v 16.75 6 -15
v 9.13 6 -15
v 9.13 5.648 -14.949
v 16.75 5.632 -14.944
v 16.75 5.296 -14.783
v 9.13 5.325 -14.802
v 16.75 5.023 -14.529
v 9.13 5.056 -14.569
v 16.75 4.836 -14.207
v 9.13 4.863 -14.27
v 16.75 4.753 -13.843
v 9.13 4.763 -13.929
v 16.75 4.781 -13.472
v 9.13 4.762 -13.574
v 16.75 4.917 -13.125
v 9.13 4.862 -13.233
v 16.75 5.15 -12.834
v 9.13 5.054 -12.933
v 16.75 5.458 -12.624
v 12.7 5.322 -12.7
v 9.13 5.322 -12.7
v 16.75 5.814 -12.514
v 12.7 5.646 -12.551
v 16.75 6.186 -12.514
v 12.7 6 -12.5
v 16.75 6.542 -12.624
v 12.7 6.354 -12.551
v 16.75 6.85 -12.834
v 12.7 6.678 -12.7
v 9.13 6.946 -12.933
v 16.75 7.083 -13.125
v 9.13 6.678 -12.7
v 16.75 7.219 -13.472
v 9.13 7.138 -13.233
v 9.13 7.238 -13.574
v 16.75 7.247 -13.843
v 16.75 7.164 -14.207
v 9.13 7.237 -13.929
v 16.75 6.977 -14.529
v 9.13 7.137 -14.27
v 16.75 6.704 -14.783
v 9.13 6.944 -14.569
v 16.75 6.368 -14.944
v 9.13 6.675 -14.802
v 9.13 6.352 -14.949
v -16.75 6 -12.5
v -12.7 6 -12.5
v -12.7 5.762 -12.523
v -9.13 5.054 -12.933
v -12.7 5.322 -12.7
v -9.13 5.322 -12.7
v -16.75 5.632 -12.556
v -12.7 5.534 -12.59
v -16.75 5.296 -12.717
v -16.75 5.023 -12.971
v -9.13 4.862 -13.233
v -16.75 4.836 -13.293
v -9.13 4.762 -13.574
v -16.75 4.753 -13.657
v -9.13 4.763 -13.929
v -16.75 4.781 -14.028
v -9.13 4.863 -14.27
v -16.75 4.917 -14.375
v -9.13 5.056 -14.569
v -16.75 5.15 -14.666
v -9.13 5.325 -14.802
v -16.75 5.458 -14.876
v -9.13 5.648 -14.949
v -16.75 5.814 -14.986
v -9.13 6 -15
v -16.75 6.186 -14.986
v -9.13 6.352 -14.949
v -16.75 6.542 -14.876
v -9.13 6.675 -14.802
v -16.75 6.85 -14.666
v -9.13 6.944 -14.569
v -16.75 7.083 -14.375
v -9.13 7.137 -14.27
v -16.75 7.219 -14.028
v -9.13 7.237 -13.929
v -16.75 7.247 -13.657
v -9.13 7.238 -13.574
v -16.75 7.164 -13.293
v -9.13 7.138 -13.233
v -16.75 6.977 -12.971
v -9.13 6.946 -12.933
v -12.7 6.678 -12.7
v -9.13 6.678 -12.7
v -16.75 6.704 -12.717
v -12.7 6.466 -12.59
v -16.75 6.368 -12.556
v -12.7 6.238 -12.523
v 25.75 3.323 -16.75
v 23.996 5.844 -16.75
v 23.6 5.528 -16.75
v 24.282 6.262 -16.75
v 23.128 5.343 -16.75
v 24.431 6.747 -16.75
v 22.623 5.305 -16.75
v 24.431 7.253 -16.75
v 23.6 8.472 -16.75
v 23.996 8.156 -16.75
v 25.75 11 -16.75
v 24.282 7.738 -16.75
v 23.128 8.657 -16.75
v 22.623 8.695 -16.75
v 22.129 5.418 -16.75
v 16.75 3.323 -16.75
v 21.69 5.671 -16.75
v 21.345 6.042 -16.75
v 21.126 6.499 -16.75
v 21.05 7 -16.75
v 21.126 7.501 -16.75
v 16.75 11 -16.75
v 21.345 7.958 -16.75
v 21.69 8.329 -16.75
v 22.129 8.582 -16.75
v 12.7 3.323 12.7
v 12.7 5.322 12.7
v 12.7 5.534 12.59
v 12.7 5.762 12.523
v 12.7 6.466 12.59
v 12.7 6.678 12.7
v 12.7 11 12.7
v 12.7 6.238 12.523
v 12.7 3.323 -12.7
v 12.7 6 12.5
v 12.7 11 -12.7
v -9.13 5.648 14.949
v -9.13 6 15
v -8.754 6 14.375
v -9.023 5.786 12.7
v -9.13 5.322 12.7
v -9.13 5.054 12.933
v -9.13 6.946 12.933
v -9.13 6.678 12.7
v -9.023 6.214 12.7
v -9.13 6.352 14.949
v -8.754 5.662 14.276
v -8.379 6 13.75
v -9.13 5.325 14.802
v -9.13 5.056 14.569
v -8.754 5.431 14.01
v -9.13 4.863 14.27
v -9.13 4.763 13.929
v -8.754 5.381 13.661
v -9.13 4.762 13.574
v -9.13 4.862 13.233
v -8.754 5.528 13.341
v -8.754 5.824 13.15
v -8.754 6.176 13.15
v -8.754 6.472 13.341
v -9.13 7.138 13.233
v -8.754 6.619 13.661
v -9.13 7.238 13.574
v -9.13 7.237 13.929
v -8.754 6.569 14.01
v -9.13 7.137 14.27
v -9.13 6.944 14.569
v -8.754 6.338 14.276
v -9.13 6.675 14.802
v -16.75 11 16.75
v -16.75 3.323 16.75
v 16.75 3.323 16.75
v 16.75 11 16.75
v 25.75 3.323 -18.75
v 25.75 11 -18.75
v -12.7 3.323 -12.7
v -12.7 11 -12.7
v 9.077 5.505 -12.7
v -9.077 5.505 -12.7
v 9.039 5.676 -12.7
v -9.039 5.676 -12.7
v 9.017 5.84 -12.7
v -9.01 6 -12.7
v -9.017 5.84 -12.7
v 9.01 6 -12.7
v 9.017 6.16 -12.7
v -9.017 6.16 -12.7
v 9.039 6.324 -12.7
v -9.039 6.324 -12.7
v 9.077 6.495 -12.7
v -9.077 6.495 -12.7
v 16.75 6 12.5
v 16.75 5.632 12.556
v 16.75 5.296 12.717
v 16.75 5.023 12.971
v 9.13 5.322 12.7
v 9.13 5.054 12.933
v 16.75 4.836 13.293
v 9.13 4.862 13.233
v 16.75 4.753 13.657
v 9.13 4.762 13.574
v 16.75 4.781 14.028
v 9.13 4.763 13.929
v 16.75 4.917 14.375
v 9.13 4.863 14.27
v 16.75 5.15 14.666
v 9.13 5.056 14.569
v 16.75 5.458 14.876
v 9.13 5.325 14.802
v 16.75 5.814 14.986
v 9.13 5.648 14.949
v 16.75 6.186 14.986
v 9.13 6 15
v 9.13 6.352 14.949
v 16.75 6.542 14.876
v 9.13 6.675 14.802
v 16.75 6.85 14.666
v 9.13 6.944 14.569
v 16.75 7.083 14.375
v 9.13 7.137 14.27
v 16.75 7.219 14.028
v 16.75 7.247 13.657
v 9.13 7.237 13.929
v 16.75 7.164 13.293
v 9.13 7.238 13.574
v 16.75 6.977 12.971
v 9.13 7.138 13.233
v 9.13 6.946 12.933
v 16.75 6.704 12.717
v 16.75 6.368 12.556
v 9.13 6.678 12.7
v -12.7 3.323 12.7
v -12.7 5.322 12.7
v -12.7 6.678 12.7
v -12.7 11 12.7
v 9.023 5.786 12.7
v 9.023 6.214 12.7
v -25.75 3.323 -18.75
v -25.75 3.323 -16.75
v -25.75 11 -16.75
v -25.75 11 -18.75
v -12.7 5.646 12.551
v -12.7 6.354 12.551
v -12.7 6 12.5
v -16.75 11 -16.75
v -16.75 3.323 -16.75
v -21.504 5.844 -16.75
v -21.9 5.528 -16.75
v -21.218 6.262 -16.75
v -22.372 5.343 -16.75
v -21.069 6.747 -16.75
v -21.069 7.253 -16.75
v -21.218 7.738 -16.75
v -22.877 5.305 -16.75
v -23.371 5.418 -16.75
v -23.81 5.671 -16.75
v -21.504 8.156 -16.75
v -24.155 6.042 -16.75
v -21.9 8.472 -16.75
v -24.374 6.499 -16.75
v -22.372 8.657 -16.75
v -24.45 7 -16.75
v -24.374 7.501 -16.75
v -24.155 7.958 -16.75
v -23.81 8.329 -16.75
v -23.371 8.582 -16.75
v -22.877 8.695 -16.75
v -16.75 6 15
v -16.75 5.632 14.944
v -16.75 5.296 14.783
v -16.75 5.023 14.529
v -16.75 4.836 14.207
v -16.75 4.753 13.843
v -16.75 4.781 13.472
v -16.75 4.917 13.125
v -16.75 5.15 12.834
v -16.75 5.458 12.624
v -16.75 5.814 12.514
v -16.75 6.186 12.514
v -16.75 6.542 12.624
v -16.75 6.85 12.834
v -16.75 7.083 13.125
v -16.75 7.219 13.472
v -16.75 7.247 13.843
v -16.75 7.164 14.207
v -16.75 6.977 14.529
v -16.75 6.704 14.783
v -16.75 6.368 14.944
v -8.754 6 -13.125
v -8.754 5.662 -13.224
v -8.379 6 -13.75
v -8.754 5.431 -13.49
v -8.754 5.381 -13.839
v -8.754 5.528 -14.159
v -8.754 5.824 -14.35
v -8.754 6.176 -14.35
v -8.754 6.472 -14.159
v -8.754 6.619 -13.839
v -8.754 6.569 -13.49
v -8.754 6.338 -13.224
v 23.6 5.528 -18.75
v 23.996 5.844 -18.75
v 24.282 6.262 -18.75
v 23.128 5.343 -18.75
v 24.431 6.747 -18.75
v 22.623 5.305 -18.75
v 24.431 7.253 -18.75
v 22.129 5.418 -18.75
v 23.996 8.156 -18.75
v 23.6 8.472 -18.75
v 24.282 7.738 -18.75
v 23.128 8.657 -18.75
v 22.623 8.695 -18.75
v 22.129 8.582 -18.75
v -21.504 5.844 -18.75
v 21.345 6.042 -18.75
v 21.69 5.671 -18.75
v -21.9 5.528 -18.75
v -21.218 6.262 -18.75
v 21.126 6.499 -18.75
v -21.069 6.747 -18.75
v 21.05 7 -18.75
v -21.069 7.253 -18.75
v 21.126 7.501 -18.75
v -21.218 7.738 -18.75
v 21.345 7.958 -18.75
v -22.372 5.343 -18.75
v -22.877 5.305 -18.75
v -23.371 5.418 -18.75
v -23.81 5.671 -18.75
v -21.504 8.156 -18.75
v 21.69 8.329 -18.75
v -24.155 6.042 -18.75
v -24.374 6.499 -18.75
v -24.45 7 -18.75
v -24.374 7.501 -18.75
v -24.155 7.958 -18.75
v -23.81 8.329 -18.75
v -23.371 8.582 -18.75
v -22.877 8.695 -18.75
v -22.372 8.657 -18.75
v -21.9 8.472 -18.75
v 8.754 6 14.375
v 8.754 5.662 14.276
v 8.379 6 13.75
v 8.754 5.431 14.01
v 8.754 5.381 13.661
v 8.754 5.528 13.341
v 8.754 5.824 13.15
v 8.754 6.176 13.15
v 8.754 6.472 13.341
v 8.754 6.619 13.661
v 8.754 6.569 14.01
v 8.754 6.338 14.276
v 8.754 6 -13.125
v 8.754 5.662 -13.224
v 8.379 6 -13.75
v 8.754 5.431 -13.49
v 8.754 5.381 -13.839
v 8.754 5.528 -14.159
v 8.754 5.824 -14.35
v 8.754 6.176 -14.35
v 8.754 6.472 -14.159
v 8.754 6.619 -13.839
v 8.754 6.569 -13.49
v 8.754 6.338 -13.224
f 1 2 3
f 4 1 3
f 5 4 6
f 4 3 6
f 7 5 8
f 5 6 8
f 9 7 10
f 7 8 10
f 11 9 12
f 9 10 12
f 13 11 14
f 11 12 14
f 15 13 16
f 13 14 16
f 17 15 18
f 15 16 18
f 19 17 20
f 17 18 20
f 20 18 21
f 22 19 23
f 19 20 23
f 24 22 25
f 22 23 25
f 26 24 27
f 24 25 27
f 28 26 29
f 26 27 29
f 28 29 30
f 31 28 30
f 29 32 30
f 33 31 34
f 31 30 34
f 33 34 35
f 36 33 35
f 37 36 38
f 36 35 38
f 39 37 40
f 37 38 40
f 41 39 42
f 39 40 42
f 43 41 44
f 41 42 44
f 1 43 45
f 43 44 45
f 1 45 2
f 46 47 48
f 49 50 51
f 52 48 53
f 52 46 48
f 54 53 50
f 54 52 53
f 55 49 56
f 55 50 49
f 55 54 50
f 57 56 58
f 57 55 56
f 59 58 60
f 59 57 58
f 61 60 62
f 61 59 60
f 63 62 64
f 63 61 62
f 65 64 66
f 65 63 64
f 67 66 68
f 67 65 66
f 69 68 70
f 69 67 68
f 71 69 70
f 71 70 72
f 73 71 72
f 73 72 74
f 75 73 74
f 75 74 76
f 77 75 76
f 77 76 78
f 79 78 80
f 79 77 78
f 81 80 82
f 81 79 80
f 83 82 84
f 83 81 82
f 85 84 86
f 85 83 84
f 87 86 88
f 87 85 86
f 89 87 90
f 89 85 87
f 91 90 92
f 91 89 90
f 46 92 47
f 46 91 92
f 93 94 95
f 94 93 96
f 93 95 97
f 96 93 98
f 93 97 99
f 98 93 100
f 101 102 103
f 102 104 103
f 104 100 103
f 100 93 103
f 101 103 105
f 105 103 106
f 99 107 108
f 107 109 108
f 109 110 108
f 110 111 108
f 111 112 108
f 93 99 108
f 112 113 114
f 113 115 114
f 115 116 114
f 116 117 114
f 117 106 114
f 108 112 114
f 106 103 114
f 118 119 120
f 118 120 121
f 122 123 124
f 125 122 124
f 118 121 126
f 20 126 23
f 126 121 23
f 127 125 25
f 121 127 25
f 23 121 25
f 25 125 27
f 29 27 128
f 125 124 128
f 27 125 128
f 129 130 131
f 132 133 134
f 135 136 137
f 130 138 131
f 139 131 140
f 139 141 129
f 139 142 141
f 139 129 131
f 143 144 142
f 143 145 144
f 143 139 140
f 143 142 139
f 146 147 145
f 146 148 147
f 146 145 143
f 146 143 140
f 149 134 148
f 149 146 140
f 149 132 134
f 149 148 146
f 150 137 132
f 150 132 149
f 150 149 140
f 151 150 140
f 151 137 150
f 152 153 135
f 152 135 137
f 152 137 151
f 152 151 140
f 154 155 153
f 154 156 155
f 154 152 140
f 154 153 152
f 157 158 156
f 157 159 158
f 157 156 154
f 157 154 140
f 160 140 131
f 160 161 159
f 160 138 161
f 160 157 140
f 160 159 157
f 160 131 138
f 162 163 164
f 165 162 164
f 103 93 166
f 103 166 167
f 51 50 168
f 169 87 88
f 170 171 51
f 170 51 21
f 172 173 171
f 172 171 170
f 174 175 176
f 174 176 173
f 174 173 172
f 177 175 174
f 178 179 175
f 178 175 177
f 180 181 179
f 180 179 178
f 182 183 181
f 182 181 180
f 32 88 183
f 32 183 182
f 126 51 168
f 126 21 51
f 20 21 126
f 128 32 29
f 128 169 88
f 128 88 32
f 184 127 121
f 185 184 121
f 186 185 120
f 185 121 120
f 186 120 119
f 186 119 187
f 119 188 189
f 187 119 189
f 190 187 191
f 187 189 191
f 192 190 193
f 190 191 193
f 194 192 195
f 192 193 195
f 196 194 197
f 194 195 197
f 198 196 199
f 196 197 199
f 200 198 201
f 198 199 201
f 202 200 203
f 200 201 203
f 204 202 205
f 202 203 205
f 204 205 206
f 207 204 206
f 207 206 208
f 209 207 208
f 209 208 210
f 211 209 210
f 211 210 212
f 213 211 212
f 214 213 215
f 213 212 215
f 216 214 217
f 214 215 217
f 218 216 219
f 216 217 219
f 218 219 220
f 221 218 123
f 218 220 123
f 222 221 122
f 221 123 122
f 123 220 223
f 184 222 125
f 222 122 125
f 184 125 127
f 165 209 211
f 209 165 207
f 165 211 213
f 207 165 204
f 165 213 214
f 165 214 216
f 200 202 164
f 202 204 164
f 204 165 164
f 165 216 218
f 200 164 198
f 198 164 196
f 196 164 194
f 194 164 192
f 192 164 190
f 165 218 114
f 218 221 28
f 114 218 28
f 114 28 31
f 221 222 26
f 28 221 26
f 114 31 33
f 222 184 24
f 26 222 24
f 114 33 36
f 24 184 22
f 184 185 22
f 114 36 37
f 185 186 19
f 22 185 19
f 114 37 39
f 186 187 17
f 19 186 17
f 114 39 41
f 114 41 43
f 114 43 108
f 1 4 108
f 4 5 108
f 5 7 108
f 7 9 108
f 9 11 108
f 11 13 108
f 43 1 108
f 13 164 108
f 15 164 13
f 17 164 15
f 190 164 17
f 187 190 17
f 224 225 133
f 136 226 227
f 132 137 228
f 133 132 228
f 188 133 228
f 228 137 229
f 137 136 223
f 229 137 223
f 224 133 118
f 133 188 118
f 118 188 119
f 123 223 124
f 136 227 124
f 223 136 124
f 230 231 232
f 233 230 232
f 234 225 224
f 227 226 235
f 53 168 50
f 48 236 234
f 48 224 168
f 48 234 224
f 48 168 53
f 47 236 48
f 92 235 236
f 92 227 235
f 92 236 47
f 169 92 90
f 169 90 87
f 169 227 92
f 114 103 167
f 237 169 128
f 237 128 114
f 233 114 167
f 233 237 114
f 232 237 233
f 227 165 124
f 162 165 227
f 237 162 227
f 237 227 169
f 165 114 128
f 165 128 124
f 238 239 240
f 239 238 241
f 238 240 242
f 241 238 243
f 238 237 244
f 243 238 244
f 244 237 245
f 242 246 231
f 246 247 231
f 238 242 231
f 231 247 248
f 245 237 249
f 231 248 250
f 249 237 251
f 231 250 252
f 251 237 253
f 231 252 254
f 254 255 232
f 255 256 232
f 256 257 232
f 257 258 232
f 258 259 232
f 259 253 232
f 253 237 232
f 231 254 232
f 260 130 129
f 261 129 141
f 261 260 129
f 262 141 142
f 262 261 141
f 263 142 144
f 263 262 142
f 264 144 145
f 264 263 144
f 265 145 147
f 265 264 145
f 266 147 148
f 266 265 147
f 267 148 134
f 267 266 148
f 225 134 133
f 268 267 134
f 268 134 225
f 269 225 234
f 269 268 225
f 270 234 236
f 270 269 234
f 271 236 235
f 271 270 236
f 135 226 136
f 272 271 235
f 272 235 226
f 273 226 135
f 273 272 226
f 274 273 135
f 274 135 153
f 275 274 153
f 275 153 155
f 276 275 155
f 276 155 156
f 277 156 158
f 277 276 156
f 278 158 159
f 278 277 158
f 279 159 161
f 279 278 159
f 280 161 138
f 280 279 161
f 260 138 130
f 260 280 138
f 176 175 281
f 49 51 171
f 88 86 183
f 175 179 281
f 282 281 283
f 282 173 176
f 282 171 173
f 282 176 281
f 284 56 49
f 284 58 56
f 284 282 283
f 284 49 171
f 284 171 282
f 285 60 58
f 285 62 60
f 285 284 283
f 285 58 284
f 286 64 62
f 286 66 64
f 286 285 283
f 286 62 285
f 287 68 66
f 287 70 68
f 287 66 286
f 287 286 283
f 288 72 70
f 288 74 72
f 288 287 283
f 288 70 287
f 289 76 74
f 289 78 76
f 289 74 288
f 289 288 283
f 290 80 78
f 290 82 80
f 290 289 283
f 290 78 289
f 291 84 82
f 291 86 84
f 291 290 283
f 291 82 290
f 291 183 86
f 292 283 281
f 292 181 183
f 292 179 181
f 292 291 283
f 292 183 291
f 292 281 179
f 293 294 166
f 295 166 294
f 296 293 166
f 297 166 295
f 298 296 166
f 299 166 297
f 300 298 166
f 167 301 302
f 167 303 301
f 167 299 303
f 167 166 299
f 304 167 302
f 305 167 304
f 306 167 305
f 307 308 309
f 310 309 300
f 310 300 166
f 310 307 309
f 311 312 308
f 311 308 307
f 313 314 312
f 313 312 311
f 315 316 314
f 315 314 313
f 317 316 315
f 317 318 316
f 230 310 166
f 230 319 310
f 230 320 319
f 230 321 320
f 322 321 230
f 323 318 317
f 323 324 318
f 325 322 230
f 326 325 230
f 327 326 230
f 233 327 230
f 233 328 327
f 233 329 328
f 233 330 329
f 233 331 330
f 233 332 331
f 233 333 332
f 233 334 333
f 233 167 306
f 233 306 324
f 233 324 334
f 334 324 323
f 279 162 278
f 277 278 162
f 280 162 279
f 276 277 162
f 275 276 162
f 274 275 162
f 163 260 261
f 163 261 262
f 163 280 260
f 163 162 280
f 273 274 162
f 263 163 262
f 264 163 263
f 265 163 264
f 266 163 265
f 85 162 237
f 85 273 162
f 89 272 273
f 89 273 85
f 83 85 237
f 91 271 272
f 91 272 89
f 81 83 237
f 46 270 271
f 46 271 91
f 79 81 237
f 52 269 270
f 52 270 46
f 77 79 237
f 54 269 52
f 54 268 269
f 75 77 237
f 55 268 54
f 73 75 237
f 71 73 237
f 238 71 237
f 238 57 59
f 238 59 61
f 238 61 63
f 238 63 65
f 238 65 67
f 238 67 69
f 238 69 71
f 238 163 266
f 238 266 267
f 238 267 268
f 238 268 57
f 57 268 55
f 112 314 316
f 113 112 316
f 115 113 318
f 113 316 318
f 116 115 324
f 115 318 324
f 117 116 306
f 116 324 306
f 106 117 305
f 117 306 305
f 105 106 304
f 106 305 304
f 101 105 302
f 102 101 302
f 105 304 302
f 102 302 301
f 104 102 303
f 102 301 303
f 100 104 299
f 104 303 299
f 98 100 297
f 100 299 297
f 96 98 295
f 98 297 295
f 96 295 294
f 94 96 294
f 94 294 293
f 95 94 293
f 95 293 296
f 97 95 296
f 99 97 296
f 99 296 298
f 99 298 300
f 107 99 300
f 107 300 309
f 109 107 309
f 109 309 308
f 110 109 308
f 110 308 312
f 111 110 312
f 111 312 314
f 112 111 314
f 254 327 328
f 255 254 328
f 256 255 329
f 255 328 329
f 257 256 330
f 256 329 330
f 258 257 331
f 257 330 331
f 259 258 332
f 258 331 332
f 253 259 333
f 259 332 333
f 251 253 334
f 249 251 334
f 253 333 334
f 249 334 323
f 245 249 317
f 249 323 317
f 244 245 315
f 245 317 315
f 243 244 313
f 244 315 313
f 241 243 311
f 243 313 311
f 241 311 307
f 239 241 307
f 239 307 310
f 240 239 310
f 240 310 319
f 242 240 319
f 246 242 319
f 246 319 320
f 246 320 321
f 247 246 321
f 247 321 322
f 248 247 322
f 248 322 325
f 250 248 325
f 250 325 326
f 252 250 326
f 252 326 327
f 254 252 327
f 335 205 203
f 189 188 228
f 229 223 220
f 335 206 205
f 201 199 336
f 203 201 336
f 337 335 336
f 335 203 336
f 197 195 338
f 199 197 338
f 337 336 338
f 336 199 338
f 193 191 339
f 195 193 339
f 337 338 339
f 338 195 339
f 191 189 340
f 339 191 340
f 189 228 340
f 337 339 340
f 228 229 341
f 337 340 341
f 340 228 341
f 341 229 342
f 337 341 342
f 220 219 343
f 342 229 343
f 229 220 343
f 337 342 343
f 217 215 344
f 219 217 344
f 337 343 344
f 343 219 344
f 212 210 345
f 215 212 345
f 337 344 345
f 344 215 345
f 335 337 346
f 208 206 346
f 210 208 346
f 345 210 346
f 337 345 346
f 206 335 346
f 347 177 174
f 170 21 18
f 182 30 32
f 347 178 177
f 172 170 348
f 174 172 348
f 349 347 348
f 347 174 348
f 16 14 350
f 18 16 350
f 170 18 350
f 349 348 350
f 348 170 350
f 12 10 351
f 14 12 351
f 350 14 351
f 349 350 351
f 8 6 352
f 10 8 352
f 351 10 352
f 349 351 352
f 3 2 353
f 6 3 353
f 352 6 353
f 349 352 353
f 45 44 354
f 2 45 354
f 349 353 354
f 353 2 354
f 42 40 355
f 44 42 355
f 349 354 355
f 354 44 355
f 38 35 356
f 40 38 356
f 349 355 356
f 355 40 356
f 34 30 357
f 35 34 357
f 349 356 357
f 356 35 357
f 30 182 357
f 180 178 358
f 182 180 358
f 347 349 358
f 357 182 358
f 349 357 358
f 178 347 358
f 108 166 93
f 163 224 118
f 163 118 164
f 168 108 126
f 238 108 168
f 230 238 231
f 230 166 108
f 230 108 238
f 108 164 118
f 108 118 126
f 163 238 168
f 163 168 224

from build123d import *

# Parameters (mm, degrees)
SKETCH1_W                      = 33.5
SKETCH1_H                      = 33.5
BOSS_EXTRUDE1_DEPTH            = 70
M3X0_5_TAPPED_HOLE1_D          = 2.5
M3X0_5_TAPPED_HOLE1_DEPTH      = 7.62
M3X0_5_TAPPED_HOLE1_TIP        = 0.751075774
M3X0_5_TAPPED_HOLE2_D          = 2.5
M3X0_5_TAPPED_HOLE2_DEPTH      = 7.62
M3X0_5_TAPPED_HOLE2_TIP        = 0.751075774
SKETCH7_W                      = 6
SKETCH7_H                      = 50
BOSS_EXTRUDE2_DEPTH            = 3
SKETCH8_W                      = 6
SKETCH8_H                      = 50
BOSS_EXTRUDE3_DEPTH            = 3
SKETCH10_W                     = 1.7
SKETCH10_H                     = 33.5
M3_CLEARANCE_HOLE1_AT_2_COUNT  = 2
M3_CLEARANCE_HOLE1_AT_2_PITCH  = 25
M3_CLEARANCE_HOLE1_AT_3_COUNT  = 2
M3_CLEARANCE_HOLE1_AT_3_PITCH  = 39.5
M3_CLEARANCE_HOLE1_AT_4_COUNT  = 2
M3_CLEARANCE_HOLE1_AT_4_PITCH  = 46.746657635
SKETCH12_W                     = 33.5
SKETCH12_H                     = 45
CUT_EXTRUDE2_DEPTH             = 32.5
M3X0_5_TAPPED_HOLE3_AT_2_COUNT = 2
M3X0_5_TAPPED_HOLE3_AT_2_PITCH = 27.5
SKETCH16_W                     = 45.5
SKETCH16_H                     = 59.85996371
CUT_EXTRUDE3_DEPTH             = 34.5
SKETCH17_W                     = 51.5
SKETCH17_H                     = 11
BOSS_EXTRUDE4_DEPTH            = 2
SKETCH22_W                     = 51.5
SKETCH22_H                     = 3.322905466
CUT_EXTRUDE5_DEPTH             = 36.5
M3_CLEARANCE_HOLE3_D           = 3.4
SKETCH24_W                     = 25.4
SKETCH24_H                     = 25.4
CUT_EXTRUDE6_DEPTH             = 8.677094534


with BuildPart() as part:
    # Sketch1 → Boss-Extrude1 (new body)
    with BuildSketch(Plane(origin=(0, 0, 0), x_dir=(1, 0, 0), z_dir=(0, 1, 0))):
        Rectangle(SKETCH1_W, SKETCH1_H)
    extrude(amount=BOSS_EXTRUDE1_DEPTH)

    # M3x0.5 Tapped Hole1
    with Locations(Plane(origin=(13.75, 70, 13.75), x_dir=(0, 0, 1), z_dir=(0, 1, 0))):
        with Locations((0, 0), (-27.5, -27.5)):
            Hole(M3X0_5_TAPPED_HOLE1_D / 2, depth=M3X0_5_TAPPED_HOLE1_DEPTH)
            with Locations((0, 0, -(M3X0_5_TAPPED_HOLE1_DEPTH + M3X0_5_TAPPED_HOLE1_TIP / 2))):  # 118° drill point
                Cone(0, M3X0_5_TAPPED_HOLE1_D / 2, M3X0_5_TAPPED_HOLE1_TIP, mode=Mode.SUBTRACT)

    # M3x0.5 Tapped Hole2
    with Locations(Plane(origin=(16.75, 6, 13.75), x_dir=(0, 0, 1), z_dir=(1, 0, 0))):
        with Locations((0, 0), (-27.5, 0)):
            Hole(M3X0_5_TAPPED_HOLE2_D / 2, depth=M3X0_5_TAPPED_HOLE2_DEPTH)
            with Locations((0, 0, -(M3X0_5_TAPPED_HOLE2_DEPTH + M3X0_5_TAPPED_HOLE2_TIP / 2))):  # 118° drill point
                Cone(0, M3X0_5_TAPPED_HOLE2_D / 2, M3X0_5_TAPPED_HOLE2_TIP, mode=Mode.SUBTRACT)

    # Sketch12 → Cut-Extrude2 (cut)
    with BuildSketch(Plane.XY.offset(16.75)):
        with Locations((0, 35.5)):
            Rectangle(SKETCH12_W, SKETCH12_H)
    extrude(amount=-CUT_EXTRUDE2_DEPTH, mode=Mode.SUBTRACT)

    # Sketch13 → M3x0.5 Tapped Hole3 (revolve, cut)
    with BuildSketch(Plane(origin=(-16.75, 6, -13.75), x_dir=(0, 0, 1), z_dir=(0, 1, 0))):
        Polygon((0, 0), (0, 8.371075774), (1.25, 7.62), (1.25, 0), align=None)
    m3x0_5_tapped_hole3 = revolve(axis=Axis((-23.1, 6, -13.75), (1, 0, 0)), mode=Mode.SUBTRACT)

    # M3x0.5 Tapped Hole3 at 2: M3x0.5 Tapped Hole3 ×2
    with Locations(*[(0, 0, i * M3X0_5_TAPPED_HOLE3_AT_2_PITCH) for i in range(1, M3X0_5_TAPPED_HOLE3_AT_2_COUNT)]):
        add(m3x0_5_tapped_hole3, mode=Mode.SUBTRACT)


with BuildPart() as body_2:
    # Sketch7 → Boss-Extrude2 (new body)
    with BuildSketch(Plane(origin=(0, 0, -16.75), x_dir=(-1, 0, 0), z_dir=(0, 0, -1))):
        with Locations((-19.75, 36)):
            Rectangle(SKETCH7_W, SKETCH7_H)
    extrude(amount=-BOSS_EXTRUDE2_DEPTH)

    # Sketch10 → M3 Clearance Hole1 (revolve, cut)
    with BuildSketch(Plane(origin=(19.75, 51, -16.75), x_dir=(0, 1, 0), z_dir=(1, 0, 0))):
        with Locations((0.85, 16.75)):
            Rectangle(SKETCH10_W, SKETCH10_H)
    m3_clearance_hole1 = revolve(axis=Axis((19.75, 51, -23.1), (0, 0, 1)), mode=Mode.SUBTRACT)

    # M3 Clearance Hole1 at 2: M3 Clearance Hole1 ×2
    with Locations(*[(0, -i * M3_CLEARANCE_HOLE1_AT_2_PITCH, 0) for i in range(1, M3_CLEARANCE_HOLE1_AT_2_COUNT)]):
        add(m3_clearance_hole1, mode=Mode.SUBTRACT)


with BuildPart() as body_3:
    # Sketch8 → Boss-Extrude3 (new body)
    with BuildSketch(Plane(origin=(0, 0, -16.75), x_dir=(-1, 0, 0), z_dir=(0, 0, -1))):
        with Locations((19.75, 36)):
            Rectangle(SKETCH8_W, SKETCH8_H)
    extrude(amount=-BOSS_EXTRUDE3_DEPTH)

    # M3 Clearance Hole1 at 3: M3 Clearance Hole1 ×2
    with Locations(*[(-i * M3_CLEARANCE_HOLE1_AT_3_PITCH, 0, 0) for i in range(1, M3_CLEARANCE_HOLE1_AT_3_COUNT)]):
        add(m3_clearance_hole1, mode=Mode.SUBTRACT)

    # M3 Clearance Hole1 at 4: M3 Clearance Hole1 ×2
    with Locations(*[Vector(-0.844980197, -0.534797593, 0) * (i * M3_CLEARANCE_HOLE1_AT_4_PITCH) for i in range(1, M3_CLEARANCE_HOLE1_AT_4_COUNT)]):
        add(m3_clearance_hole1, mode=Mode.SUBTRACT)


with BuildPart() as cut_extrude3_tool:
    # Sketch16 → Cut-Extrude3 (new body, through all)
    with BuildSketch(Plane.XY.offset(16.75)):
        with Locations((0, 40.929981855)):
            Rectangle(SKETCH16_W, SKETCH16_H)
    extrude(amount=-CUT_EXTRUDE3_DEPTH)


with BuildPart() as part_1:
    add(part.part)

    # Cut-Extrude3: cut by cut_extrude3_tool
    add(cut_extrude3_tool.part, mode=Mode.SUBTRACT)

    # Sketch17 → Boss-Extrude4 (add)
    with BuildSketch(Plane(origin=(0, 0, -16.75), x_dir=(-1, 0, 0), z_dir=(0, 0, -1))):
        with Locations((0, 5.5)):
            Rectangle(SKETCH17_W, SKETCH17_H)
    extrude(amount=BOSS_EXTRUDE4_DEPTH)

    # Sketch22 → Cut-Extrude5 (cut, through all)
    with BuildSketch(Plane(origin=(0, 0, -18.75), x_dir=(-1, 0, 0), z_dir=(0, 0, -1))):
        with Locations((0, 1.661452733)):
            Rectangle(SKETCH22_W, SKETCH22_H)
    extrude(amount=-CUT_EXTRUDE5_DEPTH, mode=Mode.SUBTRACT)

    # M3 Clearance Hole3 (through all)
    with Locations(Plane(origin=(22.75, 7, -16.75), x_dir=(1, 0, 0), z_dir=(0, 0, 1))):
        with Locations((0, 0), (-45.5, 0)):
            Hole(M3_CLEARANCE_HOLE3_D / 2)

    # Sketch24 → Cut-Extrude6 (cut, through all)
    with BuildSketch(Plane(origin=(0, 11, 0), x_dir=(1, 0, 0), z_dir=(0, 1, 0))):
        Rectangle(SKETCH24_W, SKETCH24_H)
    extrude(amount=-CUT_EXTRUDE6_DEPTH, mode=Mode.SUBTRACT)


with BuildPart() as body_2_1:
    add(body_2.part)

    # Cut-Extrude3: cut by cut_extrude3_tool
    add(cut_extrude3_tool.part, mode=Mode.SUBTRACT)


with BuildPart() as body_3_1:
    add(body_3.part)

    # Cut-Extrude3: cut by cut_extrude3_tool
    add(cut_extrude3_tool.part, mode=Mode.SUBTRACT)


solid = part_1.part
